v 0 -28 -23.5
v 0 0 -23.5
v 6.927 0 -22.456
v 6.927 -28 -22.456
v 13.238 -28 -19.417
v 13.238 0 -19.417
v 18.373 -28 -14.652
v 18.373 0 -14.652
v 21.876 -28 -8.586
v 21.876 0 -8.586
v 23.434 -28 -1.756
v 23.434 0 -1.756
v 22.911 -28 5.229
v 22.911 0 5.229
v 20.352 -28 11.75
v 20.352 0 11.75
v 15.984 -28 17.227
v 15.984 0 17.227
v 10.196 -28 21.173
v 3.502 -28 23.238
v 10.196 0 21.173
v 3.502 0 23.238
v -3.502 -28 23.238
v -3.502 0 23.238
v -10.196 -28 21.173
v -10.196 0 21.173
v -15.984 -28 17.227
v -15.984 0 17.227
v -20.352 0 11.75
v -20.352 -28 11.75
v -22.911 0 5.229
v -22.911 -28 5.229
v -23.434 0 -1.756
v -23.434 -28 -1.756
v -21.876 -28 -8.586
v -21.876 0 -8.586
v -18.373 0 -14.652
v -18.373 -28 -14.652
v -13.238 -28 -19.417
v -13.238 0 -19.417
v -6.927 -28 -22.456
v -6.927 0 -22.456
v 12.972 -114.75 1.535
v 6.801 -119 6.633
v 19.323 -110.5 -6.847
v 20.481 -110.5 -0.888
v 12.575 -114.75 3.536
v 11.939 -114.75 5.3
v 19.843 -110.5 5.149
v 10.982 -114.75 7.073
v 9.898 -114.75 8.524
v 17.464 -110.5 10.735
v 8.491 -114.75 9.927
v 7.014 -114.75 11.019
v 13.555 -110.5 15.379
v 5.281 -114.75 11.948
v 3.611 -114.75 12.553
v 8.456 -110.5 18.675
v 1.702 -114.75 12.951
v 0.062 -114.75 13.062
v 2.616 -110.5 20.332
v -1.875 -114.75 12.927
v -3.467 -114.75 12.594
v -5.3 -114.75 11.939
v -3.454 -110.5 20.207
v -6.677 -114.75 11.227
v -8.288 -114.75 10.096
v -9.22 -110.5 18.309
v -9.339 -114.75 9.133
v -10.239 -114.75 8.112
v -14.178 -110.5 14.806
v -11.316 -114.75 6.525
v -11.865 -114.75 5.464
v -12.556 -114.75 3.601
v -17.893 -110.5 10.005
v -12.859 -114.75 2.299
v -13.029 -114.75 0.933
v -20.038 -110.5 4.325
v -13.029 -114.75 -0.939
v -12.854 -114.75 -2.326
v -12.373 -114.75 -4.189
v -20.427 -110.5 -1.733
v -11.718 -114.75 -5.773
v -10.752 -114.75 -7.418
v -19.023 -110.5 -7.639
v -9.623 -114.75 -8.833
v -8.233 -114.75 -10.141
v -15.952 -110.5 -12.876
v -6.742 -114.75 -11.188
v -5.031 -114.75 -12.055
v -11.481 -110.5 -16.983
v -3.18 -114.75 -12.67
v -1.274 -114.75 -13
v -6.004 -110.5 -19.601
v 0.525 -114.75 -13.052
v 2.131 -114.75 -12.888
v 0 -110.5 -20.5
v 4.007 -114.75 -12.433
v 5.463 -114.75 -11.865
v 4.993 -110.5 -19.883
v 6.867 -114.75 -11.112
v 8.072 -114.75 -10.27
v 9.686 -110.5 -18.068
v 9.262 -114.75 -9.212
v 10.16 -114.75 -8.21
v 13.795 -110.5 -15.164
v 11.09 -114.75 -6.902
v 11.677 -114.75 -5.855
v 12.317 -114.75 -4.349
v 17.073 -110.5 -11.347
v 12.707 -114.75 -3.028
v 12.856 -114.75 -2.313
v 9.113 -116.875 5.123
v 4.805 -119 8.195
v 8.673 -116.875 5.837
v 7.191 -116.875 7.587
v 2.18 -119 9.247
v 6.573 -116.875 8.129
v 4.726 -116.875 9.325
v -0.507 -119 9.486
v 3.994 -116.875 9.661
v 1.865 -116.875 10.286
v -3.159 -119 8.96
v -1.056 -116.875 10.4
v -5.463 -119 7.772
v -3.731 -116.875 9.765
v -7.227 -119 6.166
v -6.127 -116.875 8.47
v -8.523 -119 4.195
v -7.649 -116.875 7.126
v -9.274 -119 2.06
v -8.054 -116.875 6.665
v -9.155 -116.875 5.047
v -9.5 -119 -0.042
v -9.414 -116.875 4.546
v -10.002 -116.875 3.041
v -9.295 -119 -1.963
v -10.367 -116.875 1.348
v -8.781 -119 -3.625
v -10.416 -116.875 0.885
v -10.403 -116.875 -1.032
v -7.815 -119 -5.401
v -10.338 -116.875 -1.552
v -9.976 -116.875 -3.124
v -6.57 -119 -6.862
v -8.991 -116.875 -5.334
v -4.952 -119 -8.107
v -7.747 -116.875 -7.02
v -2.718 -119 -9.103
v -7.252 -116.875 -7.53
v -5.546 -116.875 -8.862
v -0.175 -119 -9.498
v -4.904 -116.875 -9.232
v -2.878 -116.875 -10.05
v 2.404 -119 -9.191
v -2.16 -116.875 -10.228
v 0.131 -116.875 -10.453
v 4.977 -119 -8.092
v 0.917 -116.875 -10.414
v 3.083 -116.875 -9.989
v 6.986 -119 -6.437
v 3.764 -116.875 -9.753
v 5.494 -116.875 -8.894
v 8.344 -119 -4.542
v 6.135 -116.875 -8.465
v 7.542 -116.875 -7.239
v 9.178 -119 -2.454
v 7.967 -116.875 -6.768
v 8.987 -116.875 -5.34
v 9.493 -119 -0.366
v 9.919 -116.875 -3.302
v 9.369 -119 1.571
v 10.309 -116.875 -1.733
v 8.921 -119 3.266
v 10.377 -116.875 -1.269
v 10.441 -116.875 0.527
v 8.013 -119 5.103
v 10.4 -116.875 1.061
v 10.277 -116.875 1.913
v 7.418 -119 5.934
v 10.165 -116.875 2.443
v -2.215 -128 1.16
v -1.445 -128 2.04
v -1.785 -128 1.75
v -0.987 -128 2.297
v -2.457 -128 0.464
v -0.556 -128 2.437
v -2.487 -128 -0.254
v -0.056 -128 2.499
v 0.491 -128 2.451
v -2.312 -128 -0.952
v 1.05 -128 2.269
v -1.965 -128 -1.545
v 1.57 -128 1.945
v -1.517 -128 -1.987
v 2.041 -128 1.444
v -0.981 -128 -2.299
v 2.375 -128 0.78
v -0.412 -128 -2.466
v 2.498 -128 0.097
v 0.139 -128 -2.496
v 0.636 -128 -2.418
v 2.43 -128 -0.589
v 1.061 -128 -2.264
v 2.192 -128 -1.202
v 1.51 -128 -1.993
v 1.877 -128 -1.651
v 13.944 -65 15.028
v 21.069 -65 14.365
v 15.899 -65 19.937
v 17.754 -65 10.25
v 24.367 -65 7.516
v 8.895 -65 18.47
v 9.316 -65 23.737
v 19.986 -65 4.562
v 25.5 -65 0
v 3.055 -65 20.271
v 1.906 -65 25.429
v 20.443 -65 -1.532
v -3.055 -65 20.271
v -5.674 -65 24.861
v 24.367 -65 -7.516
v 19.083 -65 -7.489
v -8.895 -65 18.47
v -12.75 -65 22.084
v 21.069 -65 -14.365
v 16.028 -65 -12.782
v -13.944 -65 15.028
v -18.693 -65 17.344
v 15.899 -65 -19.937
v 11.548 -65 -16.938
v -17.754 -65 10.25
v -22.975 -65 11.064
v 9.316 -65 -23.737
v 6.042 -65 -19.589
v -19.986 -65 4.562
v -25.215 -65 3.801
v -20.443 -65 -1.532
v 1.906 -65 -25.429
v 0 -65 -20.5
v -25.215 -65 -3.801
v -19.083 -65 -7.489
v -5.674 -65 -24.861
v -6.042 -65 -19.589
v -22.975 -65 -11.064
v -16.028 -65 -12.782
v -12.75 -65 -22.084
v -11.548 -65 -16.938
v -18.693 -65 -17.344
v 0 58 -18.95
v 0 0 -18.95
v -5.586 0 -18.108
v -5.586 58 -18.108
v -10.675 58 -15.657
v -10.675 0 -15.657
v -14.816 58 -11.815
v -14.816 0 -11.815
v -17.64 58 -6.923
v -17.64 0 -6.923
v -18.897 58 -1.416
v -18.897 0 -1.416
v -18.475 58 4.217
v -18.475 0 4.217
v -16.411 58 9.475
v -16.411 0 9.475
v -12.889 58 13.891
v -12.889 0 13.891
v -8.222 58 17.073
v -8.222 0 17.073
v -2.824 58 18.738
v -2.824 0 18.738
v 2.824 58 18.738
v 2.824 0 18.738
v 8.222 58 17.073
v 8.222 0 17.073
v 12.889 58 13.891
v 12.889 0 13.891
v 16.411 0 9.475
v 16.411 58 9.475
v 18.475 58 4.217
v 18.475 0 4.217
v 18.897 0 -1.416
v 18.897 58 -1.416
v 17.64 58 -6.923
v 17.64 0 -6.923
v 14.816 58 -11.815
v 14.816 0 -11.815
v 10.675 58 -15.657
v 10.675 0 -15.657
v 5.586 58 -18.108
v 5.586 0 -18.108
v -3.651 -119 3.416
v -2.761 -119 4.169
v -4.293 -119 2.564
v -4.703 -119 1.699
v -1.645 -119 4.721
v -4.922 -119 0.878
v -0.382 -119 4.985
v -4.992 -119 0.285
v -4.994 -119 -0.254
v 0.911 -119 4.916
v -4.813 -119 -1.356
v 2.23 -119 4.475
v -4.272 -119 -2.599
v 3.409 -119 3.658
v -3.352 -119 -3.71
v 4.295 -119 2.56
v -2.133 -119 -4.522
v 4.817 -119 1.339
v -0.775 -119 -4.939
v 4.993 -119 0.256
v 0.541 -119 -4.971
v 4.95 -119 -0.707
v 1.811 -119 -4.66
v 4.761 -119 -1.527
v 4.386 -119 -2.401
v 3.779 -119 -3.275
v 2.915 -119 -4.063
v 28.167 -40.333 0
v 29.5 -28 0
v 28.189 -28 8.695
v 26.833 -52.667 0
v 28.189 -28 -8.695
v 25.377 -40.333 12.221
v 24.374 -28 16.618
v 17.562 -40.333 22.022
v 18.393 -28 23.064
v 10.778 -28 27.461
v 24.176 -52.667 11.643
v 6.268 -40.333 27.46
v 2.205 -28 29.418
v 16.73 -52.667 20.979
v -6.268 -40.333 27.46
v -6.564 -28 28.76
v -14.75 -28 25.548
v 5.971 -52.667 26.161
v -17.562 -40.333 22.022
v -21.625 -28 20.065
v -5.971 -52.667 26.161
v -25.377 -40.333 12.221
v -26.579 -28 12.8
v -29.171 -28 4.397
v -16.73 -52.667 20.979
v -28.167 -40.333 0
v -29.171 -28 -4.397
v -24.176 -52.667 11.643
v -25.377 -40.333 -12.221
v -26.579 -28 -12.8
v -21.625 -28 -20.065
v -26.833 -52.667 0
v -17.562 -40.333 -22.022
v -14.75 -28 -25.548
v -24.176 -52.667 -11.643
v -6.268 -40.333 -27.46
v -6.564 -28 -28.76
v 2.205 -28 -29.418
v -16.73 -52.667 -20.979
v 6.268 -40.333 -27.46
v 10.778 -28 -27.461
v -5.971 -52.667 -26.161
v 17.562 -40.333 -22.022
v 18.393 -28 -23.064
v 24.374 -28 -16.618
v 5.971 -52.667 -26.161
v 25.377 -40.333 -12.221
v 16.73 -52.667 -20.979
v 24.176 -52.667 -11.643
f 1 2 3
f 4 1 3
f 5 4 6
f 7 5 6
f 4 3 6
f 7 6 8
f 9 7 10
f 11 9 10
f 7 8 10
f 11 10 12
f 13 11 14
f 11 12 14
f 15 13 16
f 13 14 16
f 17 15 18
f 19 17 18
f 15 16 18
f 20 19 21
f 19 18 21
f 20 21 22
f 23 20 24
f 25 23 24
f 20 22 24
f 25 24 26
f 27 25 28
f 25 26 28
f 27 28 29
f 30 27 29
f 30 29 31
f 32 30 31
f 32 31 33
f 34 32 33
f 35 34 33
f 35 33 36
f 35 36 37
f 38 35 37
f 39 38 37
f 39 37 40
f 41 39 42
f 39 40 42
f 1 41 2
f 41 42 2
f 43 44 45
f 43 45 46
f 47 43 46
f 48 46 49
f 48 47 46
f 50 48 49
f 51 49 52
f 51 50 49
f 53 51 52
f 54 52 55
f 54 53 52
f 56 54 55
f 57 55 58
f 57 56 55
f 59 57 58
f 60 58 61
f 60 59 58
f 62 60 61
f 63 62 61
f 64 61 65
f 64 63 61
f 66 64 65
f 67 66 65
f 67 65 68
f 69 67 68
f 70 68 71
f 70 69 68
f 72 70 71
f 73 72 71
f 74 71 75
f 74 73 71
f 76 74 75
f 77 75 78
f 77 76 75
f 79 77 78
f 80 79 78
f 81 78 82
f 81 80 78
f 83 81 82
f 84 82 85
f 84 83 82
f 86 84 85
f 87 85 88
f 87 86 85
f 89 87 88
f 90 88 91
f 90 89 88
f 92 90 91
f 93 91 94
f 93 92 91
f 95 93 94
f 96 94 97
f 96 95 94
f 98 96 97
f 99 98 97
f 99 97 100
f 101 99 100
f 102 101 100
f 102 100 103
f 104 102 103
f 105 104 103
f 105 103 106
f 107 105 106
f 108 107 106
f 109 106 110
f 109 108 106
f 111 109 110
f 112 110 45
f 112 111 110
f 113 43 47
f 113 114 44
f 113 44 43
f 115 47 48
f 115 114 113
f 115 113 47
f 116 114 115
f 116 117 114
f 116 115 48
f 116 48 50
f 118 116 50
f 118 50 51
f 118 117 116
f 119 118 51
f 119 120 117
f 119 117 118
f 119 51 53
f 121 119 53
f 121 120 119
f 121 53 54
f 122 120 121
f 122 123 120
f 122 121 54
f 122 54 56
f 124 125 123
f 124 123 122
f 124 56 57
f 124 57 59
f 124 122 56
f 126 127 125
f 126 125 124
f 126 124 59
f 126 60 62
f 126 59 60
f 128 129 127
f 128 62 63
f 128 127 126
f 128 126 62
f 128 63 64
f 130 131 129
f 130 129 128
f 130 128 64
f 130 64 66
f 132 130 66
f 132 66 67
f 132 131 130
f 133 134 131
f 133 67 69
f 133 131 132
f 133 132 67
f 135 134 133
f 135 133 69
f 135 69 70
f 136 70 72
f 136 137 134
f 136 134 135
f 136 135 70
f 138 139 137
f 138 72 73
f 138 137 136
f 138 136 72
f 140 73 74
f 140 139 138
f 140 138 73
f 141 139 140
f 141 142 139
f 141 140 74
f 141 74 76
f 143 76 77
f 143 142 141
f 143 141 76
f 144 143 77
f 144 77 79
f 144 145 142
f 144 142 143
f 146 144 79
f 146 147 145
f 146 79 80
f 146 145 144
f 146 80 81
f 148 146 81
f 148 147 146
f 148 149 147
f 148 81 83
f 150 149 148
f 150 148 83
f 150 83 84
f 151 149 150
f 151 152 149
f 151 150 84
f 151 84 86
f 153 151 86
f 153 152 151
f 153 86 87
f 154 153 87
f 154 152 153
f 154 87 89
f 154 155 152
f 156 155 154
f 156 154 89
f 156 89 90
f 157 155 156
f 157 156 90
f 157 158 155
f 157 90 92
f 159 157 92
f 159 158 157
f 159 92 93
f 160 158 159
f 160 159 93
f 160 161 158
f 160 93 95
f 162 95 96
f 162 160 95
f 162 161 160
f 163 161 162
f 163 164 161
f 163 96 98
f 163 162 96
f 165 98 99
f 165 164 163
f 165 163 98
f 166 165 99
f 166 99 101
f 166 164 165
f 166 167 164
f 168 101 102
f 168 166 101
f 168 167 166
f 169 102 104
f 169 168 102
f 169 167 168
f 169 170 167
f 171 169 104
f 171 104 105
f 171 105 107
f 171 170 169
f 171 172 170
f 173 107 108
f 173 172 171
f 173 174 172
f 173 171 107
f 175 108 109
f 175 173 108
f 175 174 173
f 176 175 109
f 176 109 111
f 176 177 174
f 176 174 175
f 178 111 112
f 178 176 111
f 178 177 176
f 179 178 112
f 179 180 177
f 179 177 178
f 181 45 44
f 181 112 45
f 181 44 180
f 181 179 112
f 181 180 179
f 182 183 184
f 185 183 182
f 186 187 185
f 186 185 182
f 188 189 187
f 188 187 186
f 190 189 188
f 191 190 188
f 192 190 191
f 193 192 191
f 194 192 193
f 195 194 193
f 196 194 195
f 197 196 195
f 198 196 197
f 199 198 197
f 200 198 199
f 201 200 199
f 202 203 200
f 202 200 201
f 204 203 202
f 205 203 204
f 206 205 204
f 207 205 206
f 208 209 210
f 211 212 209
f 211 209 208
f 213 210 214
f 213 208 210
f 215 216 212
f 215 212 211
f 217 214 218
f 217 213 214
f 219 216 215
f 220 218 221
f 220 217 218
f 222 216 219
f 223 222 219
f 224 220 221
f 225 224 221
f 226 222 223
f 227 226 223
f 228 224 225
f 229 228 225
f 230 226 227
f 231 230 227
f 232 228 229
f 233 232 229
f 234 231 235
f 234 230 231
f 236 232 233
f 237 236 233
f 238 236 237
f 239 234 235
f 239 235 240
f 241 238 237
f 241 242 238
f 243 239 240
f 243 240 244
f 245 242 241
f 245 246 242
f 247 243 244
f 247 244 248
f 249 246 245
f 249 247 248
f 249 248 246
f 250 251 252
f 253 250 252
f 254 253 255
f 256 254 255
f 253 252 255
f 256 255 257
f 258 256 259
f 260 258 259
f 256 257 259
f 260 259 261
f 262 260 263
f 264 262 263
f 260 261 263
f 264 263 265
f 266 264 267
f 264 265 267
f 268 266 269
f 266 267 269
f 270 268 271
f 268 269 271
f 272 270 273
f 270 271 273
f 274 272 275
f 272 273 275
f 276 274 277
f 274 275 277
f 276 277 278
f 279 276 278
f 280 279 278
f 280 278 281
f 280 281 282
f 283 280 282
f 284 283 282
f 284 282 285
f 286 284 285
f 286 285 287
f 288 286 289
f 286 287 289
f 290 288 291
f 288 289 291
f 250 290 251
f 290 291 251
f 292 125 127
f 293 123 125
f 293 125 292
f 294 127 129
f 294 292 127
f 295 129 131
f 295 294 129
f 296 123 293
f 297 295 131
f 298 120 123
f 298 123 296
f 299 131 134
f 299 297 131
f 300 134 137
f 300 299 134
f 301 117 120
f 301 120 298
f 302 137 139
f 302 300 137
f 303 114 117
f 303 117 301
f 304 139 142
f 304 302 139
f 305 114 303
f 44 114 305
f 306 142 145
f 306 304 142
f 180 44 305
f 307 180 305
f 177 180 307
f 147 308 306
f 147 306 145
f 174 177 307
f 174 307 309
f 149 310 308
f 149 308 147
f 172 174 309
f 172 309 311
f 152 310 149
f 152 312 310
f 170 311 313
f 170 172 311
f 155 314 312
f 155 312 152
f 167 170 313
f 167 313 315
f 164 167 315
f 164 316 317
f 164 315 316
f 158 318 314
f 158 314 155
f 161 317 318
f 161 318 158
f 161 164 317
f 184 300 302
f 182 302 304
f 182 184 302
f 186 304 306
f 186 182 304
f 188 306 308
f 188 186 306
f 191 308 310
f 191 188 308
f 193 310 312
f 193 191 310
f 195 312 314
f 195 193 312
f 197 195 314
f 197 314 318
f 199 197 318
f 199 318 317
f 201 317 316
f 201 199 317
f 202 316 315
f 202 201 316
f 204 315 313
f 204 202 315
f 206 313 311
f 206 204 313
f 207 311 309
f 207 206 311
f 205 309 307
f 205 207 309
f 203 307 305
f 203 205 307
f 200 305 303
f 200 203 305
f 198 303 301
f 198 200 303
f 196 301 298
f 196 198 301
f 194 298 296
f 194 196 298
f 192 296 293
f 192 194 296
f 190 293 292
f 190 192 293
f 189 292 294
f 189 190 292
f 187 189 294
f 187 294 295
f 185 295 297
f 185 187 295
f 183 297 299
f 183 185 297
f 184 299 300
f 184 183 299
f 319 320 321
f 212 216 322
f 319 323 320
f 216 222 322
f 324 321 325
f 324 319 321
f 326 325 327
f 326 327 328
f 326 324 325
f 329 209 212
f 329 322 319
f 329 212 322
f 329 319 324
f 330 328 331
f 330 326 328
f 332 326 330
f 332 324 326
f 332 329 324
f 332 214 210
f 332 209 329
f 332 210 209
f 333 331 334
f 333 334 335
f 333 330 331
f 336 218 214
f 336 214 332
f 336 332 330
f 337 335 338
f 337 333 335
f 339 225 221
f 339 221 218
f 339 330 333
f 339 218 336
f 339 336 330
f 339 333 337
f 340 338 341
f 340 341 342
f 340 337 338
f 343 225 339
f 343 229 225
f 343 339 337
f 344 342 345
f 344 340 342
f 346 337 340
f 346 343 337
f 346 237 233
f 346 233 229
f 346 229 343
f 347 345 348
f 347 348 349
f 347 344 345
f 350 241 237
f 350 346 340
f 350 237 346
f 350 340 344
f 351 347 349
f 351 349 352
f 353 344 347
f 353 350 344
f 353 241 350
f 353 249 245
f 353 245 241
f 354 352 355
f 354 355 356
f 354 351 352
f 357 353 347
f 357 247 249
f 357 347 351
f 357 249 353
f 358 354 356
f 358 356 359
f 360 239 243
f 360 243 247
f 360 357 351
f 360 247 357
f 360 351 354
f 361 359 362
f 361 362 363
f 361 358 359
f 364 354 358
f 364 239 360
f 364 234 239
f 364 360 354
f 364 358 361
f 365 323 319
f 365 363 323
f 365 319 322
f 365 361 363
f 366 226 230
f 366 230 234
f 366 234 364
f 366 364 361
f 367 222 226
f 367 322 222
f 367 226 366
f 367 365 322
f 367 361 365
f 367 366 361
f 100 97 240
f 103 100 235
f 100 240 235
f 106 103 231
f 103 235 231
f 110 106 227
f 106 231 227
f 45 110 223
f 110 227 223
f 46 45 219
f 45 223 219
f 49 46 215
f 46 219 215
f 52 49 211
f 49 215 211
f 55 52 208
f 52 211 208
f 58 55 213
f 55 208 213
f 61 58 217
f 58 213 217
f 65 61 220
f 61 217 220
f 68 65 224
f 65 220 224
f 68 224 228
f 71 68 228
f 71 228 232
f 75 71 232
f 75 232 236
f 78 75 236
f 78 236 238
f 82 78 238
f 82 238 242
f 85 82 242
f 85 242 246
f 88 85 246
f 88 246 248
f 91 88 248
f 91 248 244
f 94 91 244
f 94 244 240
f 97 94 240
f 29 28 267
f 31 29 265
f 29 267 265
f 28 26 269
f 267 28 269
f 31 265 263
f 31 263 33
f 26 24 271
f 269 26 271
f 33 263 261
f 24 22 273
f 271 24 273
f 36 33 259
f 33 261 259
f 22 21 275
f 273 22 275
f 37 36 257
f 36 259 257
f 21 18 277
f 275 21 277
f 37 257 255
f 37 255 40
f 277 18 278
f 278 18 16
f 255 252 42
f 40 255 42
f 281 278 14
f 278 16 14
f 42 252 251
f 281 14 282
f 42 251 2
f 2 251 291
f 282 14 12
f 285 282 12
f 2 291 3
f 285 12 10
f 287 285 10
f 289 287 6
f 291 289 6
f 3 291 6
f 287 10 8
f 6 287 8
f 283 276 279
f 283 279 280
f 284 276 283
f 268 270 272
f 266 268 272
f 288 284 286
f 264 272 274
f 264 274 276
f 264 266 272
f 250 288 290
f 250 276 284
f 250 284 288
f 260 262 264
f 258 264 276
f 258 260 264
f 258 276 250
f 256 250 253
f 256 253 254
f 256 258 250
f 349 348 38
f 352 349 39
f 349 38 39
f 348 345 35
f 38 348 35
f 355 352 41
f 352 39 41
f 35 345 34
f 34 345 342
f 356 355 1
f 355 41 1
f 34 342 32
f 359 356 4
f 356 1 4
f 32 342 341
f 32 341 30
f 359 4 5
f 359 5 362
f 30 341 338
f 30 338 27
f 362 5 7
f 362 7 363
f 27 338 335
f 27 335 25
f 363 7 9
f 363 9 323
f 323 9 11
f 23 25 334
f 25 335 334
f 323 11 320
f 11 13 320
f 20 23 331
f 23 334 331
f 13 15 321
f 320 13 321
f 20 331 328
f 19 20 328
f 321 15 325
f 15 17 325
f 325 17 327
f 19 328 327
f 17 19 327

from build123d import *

# Parameters (mm, degrees)
SKETCH1_R           = 18.95
BOSS_EXTRUDE1_DEPTH = 58
SKETCH2_R           = 23.5
BOSS_EXTRUDE2_DEPTH = 28
SKETCH3_R           = 29.5
SKETCH4_R           = 25.5
SKETCH6_R           = 20.5
BOSS_EXTRUDE3_DEPTH = 45.5


with BuildPart() as part:
    # Sketch1 → Boss-Extrude1 (new body)
    with BuildSketch(Plane(origin=(0, 0, 0), x_dir=(1, 0, 0), z_dir=(0, 1, 0))):
        with Locations(Location((0, 0, 0), (0, 0, 90))):
            Circle(SKETCH1_R)
    extrude(amount=BOSS_EXTRUDE1_DEPTH)

    # Sketch2 → Boss-Extrude2 (add)
    with BuildSketch(Plane.XZ):
        with Locations(Location((0, 0, 0), (0, 0, 270))):
            Circle(SKETCH2_R)
    extrude(amount=BOSS_EXTRUDE2_DEPTH)

    # Sketch3 → Loft1 section 0
    with BuildSketch(Plane.XZ.offset(28)):
        Circle(SKETCH3_R)
    # Sketch4 → Loft1 section 1
    with BuildSketch(Plane(origin=(0, -65, 0), x_dir=(-1, 0, 0), z_dir=(0, -1, 0))):
        Circle(SKETCH4_R)
    loft()

    # Sketch6 → Boss-Extrude3 (add)
    with BuildSketch(Plane.XZ.offset(65)):
        with Locations(Location((0, 0, 0), (0, 0, 270))):
            Circle(SKETCH6_R)
    extrude(amount=BOSS_EXTRUDE3_DEPTH)

    # Loft2: read off the stored shape, not the designer's step
    # Loft2: loft between two sections, ruled curve by curve
    loft2_from = [
        Edge.make_bspline([(19.32271694, -110.5, -6.847087705), (33.01689235, -110.5, 31.798346176), (-5.628541531, -110.5, 45.492521586), (-19.32271694, -110.5, 6.847087705), (-33.01689235, -110.5, -31.798346176), (5.628541531, -110.5, -45.492521586), (19.32271694, -110.5, -6.847087705)], [0, 0, 0, 0, 0.5, 0.5, 0.5, 1, 1, 1, 1], 3, [1, 0.333333333, 0.333333333, 1, 0.333333333, 0.333333333, 1]),
    ]
    loft2_to = [
        Edge.make_bspline([(6.801396589, -119, 6.63257148), (-6.463746372, -119, 20.235364658), (-20.06653955, -119, 6.970221697), (-6.801396589, -119, -6.63257148), (6.463746372, -119, -20.235364658), (20.06653955, -119, -6.970221697), (6.801396589, -119, 6.63257148)], [0, 0, 0, 0, 0.5, 0.5, 0.5, 1, 1, 1, 1], 3, [1, 0.333333333, 0.333333333, 1, 0.333333333, 0.333333333, 1]),
    ]
    loft2 = Solid(Shell([*[Face.make_surface_from_curves(loft2_from[k], loft2_to[k]) for k in range(1)], Face(Wire(loft2_from)), Face(Wire(loft2_to))]))
    add(loft2)

    # Loft5: read off the stored shape, not the designer's step
    # Loft5: loft between two sections, ruled curve by curve
    loft5_from = [
        Edge.make_bspline([(-4.99352595, -119, -0.254359166), (-4.484807619, -119, -10.241411066), (5.502244282, -119, -9.732692735), (4.99352595, -119, 0.254359166), (4.484807619, -119, 10.241411066), (-5.502244282, -119, 9.732692735), (-4.99352595, -119, -0.254359166)], [0, 0, 0, 0, 0.5, 0.5, 0.5, 1, 1, 1, 1], 3, [1, 0.333333333, 0.333333333, 1, 0.333333333, 0.333333333, 1]),
    ]
    loft5_to = [
        Edge.make_bspline([(-1.785448857, -128, 1.749906392), (-5.28526164, -128, -1.820991321), (-1.714363927, -128, -5.320804105), (1.785448857, -128, -1.749906392), (5.28526164, -128, 1.820991321), (1.714363927, -128, 5.320804105), (-1.785448857, -128, 1.749906392)], [0, 0, 0, 0, 0.5, 0.5, 0.5, 1, 1, 1, 1], 3, [1, 0.333333333, 0.333333333, 1, 0.333333333, 0.333333333, 1]),
    ]
    loft5 = Solid(Shell([*[Face.make_surface_from_curves(loft5_from[k], loft5_to[k]) for k in range(1)], Face(Wire(loft5_from)), Face(Wire(loft5_to))]))
    add(loft5)


solid = part.part
